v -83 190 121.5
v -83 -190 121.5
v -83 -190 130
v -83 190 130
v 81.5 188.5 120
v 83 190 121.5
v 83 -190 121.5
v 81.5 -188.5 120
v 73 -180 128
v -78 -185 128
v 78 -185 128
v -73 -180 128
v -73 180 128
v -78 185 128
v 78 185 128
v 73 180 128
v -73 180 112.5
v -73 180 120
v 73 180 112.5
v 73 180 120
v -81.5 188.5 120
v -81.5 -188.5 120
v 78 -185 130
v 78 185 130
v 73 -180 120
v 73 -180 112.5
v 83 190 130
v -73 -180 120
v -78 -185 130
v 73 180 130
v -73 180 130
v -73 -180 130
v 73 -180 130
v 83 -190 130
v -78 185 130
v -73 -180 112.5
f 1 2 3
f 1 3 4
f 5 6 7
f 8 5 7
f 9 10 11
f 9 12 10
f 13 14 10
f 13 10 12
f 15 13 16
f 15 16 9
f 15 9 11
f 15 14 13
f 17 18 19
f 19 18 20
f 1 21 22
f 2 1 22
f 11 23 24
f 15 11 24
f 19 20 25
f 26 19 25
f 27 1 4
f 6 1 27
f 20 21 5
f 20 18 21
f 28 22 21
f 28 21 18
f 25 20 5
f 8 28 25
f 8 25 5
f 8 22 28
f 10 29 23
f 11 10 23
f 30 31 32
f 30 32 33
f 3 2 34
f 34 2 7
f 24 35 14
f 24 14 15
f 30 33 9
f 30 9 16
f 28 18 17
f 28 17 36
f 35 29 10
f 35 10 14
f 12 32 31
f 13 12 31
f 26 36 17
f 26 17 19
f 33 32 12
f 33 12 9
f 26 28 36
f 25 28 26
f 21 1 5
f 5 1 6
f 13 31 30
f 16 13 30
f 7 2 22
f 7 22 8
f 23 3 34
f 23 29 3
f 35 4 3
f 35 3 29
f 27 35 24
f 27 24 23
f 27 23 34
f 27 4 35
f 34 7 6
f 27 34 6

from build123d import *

# Parameters (mm, degrees)
SKETCH004_W     = 166
SKETCH004_H     = 380
PAD002_DEPTH    = 130
SKETCH005_W     = 166
SKETCH005_H     = 380
POCKET002_DEPTH = 120
SKETCH006_W     = 146
SKETCH006_H     = 360
PAD003_DEPTH    = 7.5
SKETCH015_W     = 156
SKETCH015_H     = 370
SKETCH015_W_2   = 146
SKETCH015_H_2   = 360
POCKET008_DEPTH = 2
CHAMFER005_SIZE = 1.5


with BuildPart() as part:
    # Sketch004 → Pad002 (new body)
    with BuildSketch(Plane.XY):
        Rectangle(SKETCH004_W, SKETCH004_H)
    extrude(amount=PAD002_DEPTH)

    # Sketch005 (on Face5 of Pad002) → Pocket002 (cut)
    with BuildSketch(Plane(origin=(0, 0, 0), x_dir=(1, 0, 0), z_dir=(0, 0, -1))):
        Rectangle(SKETCH005_W, SKETCH005_H)
    extrude(amount=-POCKET002_DEPTH, mode=Mode.SUBTRACT)

    # Sketch006 (on Face2 of Pocket002) → Pad003 (join)
    with BuildSketch(Plane(origin=(0, 0, 120), x_dir=(1, 0, 0), z_dir=(0, 0, -1))):
        Rectangle(SKETCH006_W, SKETCH006_H)
    extrude(amount=PAD003_DEPTH)

    # Sketch015 (on Face4 of Pad003) → Pocket008 (cut)
    with BuildSketch(Plane.XY.offset(130)):
        Rectangle(SKETCH015_W, SKETCH015_H)
        Rectangle(SKETCH015_W_2, SKETCH015_H_2, mode=Mode.SUBTRACT)
    extrude(amount=-POCKET008_DEPTH, mode=Mode.SUBTRACT)

    # Chamfer005
    chamfer005_edges = [part.edges().sort_by_distance(p)[0] for p in [
        (83, 0, 120),
        (0, -190, 120),
        (-83, 0, 120),
        (0, 190, 120),
    ]]
    chamfer(chamfer005_edges, length=CHAMFER005_SIZE)


solid = part.part
